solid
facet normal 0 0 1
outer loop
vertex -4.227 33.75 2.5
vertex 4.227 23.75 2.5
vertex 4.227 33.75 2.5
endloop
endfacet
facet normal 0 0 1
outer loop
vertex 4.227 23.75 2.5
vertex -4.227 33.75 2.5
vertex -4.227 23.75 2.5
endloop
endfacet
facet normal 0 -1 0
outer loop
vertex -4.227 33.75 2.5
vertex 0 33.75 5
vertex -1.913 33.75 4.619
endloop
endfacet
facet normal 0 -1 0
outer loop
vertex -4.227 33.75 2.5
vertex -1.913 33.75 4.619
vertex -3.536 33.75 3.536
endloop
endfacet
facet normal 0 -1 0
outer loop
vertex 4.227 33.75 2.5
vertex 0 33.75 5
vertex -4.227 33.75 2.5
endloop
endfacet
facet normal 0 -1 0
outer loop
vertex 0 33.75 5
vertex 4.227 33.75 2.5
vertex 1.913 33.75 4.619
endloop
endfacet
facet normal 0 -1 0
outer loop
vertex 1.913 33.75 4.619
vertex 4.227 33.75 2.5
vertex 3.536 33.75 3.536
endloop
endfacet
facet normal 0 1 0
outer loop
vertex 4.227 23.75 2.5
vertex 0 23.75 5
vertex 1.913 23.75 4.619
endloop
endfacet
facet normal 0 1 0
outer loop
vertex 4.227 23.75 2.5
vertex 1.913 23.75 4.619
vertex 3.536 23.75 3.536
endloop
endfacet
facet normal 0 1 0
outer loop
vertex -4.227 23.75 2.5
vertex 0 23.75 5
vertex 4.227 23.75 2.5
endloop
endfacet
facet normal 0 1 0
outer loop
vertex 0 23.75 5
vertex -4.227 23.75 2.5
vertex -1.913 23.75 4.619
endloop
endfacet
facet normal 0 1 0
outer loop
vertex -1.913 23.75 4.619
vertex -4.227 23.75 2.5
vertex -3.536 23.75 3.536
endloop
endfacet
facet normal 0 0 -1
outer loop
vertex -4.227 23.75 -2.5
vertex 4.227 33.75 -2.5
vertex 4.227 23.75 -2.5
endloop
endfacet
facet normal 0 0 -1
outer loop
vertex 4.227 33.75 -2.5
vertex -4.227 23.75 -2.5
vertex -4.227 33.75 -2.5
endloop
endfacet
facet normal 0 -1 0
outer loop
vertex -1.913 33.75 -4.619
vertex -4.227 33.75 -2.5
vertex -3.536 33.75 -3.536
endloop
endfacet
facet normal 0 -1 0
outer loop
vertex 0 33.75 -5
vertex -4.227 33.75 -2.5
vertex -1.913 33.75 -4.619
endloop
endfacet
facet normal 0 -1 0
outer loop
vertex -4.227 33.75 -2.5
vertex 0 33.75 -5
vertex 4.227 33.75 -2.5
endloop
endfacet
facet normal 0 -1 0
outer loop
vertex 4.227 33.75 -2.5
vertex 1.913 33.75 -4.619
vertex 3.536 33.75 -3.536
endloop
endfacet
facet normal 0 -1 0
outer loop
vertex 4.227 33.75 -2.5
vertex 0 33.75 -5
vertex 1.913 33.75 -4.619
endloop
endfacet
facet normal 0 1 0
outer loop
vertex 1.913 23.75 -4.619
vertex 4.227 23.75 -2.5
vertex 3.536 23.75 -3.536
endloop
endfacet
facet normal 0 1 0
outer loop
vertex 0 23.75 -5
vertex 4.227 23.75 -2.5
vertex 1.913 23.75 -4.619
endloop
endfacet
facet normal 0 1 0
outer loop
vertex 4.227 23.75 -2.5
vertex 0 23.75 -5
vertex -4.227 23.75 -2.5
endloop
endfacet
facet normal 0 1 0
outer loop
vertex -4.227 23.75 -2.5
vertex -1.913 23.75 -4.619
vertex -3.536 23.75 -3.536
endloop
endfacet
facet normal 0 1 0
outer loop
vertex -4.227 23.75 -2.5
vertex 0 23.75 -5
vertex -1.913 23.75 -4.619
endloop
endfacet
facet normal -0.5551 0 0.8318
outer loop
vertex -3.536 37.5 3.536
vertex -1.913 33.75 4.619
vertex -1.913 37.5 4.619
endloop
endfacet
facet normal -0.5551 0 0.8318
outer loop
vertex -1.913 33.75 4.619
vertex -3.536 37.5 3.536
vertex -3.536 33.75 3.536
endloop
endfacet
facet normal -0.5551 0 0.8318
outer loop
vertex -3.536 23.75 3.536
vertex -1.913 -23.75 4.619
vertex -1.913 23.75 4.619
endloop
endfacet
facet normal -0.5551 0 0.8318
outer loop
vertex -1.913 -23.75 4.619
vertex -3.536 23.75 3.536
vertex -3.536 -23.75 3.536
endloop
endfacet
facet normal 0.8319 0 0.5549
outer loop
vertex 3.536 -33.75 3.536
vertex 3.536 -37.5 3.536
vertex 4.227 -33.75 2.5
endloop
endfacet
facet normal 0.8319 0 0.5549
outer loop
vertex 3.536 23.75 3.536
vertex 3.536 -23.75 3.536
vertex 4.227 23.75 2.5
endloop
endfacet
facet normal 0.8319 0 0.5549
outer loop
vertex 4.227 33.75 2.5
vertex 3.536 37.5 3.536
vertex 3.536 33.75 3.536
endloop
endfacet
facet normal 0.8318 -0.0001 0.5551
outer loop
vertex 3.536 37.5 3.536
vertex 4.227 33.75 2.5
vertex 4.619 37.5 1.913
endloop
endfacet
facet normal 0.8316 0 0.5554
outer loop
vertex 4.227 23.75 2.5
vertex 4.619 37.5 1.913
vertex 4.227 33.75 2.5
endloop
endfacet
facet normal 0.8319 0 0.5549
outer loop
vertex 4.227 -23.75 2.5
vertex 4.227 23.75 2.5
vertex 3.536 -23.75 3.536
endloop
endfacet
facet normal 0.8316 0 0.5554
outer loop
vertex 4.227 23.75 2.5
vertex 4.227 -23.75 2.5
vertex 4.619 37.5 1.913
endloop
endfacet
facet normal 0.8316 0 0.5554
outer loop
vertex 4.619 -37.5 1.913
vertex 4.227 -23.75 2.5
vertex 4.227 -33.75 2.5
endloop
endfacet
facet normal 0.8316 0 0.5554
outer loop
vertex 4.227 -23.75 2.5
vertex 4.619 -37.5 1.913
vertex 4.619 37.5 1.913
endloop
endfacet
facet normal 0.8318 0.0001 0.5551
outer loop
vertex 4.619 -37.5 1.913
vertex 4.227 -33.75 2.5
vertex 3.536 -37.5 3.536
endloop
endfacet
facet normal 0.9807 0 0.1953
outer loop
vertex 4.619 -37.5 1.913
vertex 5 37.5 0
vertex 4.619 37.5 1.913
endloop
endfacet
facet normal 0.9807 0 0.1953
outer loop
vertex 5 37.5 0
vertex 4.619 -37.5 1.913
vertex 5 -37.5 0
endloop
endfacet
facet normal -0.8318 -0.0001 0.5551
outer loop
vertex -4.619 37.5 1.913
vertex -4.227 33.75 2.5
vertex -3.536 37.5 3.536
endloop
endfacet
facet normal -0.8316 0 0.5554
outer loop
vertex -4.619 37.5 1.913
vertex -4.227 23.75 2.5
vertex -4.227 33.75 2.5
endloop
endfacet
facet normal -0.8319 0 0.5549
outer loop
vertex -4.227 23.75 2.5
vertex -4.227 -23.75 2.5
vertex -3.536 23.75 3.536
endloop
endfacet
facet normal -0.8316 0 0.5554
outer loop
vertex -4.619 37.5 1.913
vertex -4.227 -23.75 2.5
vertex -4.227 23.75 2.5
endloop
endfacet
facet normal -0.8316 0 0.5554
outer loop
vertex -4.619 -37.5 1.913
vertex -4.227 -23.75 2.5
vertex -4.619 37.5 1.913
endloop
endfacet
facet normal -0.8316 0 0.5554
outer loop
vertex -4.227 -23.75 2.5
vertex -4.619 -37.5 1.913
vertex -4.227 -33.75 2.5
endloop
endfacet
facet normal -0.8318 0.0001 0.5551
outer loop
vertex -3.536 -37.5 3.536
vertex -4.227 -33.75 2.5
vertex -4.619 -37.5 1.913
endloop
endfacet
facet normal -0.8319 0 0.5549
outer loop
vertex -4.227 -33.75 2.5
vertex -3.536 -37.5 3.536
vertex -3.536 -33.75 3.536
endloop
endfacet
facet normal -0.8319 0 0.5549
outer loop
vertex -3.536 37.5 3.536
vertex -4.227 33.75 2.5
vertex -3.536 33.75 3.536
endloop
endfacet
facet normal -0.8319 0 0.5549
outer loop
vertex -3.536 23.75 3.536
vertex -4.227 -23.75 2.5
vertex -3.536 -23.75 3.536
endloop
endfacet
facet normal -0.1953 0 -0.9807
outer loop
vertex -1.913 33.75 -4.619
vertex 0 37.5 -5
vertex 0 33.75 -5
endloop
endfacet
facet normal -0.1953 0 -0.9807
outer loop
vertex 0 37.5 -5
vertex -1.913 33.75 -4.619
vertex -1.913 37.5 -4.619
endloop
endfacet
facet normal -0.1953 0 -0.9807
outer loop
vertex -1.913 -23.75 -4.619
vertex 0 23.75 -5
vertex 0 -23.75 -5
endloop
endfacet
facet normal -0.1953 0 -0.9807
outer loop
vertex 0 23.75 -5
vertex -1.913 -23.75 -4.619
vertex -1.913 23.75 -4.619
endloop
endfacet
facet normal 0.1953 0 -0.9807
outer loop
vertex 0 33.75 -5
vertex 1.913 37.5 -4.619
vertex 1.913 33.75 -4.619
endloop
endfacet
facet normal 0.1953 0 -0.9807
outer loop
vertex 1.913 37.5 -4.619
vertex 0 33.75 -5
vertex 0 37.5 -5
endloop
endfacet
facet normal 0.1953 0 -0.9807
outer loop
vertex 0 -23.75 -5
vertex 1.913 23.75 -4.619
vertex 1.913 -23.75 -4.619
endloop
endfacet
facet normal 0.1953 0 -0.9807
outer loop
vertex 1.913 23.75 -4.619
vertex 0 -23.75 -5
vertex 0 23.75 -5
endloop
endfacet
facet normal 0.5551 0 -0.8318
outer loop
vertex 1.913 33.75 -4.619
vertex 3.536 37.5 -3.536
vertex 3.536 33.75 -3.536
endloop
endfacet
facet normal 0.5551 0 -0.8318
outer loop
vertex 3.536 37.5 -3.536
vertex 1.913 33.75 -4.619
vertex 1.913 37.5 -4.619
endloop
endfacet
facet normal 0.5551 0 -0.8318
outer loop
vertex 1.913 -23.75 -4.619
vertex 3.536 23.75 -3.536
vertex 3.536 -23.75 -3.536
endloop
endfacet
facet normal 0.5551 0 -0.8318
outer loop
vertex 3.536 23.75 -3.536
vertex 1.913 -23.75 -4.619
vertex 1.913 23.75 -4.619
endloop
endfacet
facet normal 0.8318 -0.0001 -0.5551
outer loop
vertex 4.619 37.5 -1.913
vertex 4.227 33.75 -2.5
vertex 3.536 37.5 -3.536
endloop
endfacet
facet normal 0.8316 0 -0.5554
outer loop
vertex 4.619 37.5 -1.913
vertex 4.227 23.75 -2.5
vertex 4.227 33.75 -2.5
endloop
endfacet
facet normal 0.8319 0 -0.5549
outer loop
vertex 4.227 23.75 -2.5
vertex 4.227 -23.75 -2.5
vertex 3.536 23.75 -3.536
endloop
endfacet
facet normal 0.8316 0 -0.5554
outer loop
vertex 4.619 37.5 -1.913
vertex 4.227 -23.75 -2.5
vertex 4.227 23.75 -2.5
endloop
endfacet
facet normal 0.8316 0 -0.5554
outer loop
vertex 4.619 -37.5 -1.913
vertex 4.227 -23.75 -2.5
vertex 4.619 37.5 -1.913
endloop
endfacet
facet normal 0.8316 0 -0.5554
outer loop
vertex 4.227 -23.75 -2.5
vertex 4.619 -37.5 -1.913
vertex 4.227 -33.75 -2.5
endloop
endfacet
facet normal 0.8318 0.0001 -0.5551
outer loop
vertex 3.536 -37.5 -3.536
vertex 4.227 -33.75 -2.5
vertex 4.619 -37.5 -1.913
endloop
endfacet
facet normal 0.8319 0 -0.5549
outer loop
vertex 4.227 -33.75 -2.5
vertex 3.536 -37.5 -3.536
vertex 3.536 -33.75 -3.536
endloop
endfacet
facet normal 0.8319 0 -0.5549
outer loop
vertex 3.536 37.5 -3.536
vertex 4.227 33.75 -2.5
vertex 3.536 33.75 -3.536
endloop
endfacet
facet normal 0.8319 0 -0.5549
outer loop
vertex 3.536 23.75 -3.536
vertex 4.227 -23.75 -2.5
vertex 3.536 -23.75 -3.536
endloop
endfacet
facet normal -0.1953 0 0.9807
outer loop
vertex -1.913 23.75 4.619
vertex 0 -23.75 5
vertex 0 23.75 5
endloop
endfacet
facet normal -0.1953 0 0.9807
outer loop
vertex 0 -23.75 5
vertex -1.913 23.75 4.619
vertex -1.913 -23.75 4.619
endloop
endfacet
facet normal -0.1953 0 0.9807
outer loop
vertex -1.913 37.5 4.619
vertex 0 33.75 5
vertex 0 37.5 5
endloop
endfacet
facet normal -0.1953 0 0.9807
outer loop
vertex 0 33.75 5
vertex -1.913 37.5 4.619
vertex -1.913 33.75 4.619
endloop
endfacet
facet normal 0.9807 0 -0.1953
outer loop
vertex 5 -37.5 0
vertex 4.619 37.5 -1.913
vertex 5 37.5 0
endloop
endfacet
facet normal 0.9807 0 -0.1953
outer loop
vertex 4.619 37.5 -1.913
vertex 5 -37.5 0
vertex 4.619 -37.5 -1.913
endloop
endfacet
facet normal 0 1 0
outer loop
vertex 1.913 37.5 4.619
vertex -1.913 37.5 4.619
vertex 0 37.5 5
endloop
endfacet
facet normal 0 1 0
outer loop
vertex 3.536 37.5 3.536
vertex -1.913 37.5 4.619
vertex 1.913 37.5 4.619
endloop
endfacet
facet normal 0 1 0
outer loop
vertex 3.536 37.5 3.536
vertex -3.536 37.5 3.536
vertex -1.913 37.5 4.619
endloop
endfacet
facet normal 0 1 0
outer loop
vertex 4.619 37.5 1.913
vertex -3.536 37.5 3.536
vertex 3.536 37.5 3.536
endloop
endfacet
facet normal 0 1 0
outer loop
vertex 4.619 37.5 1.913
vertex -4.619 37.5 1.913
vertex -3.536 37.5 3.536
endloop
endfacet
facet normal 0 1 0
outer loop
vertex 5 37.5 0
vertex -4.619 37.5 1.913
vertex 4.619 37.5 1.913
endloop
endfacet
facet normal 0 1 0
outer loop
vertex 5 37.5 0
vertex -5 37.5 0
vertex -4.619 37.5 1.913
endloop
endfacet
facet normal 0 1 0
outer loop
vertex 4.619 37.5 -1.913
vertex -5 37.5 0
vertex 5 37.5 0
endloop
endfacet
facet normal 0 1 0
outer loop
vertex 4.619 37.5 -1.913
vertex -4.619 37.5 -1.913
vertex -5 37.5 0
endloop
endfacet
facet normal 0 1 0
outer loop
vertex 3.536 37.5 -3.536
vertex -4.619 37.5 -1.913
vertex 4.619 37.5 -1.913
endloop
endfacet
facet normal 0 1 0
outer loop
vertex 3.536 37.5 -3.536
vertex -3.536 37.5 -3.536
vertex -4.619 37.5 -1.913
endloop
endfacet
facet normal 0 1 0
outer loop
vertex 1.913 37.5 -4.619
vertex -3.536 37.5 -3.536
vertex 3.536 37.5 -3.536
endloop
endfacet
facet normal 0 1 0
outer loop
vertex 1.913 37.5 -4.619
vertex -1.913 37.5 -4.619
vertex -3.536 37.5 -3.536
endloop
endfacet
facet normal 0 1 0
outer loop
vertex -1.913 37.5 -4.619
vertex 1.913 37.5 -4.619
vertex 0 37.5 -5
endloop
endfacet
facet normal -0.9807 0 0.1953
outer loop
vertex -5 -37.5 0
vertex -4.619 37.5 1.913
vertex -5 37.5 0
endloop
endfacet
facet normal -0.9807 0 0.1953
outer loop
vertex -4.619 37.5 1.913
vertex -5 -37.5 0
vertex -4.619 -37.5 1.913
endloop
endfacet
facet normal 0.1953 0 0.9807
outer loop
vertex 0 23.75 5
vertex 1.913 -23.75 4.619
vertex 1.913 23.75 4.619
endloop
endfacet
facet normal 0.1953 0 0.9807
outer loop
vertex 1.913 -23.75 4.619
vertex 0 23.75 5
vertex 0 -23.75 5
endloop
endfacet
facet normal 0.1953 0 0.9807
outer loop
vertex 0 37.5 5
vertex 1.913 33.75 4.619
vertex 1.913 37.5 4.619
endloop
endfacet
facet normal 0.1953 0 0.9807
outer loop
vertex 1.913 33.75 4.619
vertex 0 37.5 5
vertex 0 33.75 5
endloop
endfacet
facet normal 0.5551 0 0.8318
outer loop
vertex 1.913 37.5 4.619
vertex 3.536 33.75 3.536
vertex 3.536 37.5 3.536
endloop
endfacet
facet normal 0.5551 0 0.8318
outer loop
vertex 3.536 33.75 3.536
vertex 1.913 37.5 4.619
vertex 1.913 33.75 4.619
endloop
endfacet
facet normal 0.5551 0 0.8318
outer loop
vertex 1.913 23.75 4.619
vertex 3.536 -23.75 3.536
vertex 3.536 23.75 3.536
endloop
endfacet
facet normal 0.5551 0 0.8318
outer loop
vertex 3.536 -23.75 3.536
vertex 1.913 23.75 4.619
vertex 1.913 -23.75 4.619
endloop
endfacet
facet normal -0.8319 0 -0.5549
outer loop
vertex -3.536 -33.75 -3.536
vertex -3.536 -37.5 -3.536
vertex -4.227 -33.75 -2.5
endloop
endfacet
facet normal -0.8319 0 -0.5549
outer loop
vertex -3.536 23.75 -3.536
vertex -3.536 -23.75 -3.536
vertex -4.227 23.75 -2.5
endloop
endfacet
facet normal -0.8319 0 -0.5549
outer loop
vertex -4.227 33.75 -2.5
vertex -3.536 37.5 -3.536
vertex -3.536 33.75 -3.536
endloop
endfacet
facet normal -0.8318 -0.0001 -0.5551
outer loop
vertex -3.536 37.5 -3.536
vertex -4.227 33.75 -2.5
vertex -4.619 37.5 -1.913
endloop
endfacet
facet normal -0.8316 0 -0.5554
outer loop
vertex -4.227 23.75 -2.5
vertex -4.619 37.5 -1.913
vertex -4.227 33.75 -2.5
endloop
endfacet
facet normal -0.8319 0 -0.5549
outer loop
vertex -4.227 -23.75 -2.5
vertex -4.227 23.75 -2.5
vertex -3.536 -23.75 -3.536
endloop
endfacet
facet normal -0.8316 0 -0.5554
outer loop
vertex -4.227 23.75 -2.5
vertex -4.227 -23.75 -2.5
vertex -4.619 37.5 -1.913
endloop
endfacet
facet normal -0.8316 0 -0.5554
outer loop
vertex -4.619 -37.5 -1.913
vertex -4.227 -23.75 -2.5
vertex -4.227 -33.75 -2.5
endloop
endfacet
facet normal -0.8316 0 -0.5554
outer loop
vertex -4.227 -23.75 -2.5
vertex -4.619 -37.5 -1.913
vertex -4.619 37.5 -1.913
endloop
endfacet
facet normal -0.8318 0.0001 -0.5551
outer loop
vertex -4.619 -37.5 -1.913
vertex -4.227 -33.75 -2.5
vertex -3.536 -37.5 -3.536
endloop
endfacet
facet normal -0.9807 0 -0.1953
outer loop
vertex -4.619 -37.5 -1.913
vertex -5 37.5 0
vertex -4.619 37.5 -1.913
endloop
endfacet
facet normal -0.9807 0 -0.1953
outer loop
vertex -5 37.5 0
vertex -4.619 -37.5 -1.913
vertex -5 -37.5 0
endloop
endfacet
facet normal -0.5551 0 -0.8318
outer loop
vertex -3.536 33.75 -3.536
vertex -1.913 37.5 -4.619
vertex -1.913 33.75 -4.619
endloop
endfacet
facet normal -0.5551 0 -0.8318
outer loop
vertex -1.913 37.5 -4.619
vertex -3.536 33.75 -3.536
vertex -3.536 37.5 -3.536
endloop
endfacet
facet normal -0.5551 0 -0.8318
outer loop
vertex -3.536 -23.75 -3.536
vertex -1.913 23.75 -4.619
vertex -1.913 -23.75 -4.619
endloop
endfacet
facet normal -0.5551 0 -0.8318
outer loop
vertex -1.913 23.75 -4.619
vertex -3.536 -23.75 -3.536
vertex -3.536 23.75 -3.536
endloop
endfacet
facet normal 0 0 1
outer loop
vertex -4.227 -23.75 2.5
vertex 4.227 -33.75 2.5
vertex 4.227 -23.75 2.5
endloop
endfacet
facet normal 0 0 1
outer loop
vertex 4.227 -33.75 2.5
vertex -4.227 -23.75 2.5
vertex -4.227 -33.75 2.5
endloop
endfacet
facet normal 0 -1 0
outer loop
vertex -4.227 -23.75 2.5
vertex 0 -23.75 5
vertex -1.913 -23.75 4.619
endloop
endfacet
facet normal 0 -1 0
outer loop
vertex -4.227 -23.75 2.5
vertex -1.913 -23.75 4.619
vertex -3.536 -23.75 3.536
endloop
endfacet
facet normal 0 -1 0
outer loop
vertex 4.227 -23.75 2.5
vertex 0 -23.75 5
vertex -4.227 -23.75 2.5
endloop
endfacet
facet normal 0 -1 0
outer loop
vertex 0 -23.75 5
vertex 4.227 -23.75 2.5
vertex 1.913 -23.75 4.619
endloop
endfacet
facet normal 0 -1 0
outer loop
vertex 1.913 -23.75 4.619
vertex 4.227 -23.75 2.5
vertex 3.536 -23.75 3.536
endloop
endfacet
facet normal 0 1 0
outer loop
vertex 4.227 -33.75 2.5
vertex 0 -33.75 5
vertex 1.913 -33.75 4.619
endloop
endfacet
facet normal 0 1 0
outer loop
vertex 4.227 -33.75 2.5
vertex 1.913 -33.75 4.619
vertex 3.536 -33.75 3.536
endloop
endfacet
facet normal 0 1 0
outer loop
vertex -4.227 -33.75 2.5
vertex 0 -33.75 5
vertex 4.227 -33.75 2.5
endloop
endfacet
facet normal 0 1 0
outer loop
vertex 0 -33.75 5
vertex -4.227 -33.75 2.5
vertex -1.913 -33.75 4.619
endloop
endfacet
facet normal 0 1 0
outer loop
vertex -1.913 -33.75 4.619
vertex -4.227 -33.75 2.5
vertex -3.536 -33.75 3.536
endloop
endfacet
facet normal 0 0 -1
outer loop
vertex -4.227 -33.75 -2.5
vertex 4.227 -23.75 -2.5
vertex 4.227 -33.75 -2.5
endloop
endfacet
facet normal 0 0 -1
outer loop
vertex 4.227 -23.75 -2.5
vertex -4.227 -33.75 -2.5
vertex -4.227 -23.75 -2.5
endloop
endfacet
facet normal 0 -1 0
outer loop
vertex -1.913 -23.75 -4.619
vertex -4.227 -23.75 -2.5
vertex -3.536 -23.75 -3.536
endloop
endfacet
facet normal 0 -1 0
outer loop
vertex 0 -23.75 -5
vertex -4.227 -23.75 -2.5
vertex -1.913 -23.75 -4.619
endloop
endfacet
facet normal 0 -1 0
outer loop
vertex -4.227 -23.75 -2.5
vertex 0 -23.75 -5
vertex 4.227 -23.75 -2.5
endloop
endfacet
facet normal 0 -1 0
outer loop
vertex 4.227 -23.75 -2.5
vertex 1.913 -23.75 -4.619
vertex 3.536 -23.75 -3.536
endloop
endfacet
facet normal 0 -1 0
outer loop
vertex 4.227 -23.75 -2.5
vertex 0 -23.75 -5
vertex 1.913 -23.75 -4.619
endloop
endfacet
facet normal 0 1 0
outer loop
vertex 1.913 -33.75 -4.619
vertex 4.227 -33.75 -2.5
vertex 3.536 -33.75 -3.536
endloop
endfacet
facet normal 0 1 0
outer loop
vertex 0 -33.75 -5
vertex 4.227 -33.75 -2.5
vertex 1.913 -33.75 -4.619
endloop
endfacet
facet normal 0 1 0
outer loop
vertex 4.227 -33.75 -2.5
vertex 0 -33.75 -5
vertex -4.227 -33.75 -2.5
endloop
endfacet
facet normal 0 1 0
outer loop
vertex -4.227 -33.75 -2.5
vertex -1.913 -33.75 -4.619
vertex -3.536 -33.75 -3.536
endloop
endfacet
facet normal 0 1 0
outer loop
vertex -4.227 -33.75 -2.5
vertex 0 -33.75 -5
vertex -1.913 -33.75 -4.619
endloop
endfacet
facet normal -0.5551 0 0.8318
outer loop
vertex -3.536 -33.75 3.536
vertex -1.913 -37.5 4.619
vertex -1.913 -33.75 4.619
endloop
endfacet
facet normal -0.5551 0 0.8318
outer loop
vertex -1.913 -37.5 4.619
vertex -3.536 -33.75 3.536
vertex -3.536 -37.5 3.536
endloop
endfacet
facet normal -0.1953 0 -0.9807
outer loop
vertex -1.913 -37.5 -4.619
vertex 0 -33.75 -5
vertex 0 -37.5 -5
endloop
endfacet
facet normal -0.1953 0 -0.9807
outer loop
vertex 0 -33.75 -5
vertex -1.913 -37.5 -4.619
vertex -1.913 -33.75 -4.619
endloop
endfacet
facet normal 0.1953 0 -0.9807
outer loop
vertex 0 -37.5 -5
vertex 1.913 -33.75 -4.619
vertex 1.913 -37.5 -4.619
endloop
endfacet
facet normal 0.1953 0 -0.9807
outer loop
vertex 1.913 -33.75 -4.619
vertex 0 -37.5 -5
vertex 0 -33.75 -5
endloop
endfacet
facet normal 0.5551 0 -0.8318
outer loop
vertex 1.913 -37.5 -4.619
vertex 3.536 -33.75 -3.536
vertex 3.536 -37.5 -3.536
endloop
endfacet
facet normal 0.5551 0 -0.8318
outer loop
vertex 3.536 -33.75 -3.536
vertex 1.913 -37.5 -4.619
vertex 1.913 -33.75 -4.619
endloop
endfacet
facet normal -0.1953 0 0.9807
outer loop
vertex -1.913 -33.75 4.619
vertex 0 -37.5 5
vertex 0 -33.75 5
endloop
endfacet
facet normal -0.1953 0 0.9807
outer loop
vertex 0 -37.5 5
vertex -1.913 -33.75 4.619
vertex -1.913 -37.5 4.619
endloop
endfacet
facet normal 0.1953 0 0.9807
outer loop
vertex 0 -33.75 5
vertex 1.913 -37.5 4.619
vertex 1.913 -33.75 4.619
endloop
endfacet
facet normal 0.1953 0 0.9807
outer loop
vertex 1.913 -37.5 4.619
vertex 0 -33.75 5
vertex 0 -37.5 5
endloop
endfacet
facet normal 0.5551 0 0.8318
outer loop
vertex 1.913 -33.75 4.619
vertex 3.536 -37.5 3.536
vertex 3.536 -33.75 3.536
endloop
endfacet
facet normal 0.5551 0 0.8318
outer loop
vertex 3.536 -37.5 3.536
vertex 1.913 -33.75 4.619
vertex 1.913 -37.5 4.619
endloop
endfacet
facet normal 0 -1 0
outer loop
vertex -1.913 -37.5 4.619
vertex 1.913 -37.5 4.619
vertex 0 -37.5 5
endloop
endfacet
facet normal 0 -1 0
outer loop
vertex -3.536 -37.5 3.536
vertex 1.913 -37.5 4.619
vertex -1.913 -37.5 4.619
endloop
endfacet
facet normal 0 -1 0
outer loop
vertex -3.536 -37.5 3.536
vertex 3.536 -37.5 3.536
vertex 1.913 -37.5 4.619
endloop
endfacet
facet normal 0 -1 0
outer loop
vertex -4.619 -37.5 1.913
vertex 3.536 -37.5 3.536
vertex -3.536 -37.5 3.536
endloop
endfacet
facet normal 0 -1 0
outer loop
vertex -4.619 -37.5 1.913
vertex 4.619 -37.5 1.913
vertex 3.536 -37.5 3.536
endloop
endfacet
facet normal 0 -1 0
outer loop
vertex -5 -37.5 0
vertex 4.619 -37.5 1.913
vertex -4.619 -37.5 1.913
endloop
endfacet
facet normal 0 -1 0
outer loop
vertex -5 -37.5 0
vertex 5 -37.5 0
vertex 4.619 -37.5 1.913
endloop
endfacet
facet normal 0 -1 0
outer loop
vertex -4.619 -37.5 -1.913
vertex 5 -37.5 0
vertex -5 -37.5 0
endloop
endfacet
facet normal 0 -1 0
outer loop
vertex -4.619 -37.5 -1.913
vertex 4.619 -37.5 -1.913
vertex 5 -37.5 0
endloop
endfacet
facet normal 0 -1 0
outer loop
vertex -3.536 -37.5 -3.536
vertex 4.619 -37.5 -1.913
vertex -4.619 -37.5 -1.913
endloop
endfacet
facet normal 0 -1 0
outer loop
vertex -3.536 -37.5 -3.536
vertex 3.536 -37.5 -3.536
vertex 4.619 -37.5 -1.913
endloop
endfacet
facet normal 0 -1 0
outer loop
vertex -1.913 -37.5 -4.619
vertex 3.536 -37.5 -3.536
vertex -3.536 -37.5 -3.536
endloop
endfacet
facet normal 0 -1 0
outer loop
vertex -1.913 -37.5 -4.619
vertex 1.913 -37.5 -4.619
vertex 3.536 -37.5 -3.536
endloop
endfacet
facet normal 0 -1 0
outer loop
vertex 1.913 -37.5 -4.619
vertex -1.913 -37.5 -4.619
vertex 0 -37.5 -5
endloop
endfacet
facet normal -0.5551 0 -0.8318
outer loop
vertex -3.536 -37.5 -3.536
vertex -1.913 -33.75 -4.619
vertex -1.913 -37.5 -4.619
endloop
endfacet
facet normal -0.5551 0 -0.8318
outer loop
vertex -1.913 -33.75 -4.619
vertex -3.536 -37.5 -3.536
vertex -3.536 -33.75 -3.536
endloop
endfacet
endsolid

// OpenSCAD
//Lincoln Logs

//All measurements below in mm
//You only need to change length and radius of log

//Length of Log
    L=40;
//Radius of Log
    R=5;
    
//Cutout Cube Size for Endcap Difference
    w=R*2;
    d=R*2;
    h=R;
//Length of Endcap
    E=w+1.5*R;
//Angle Log is Oriented At
    X=90;
    Y=0;
    Z=0;
//Translate Endcaps
    a=0;
    b=(L/2)+(E/2);
    c=0;
//Translate Cutouts
    x=0;
    y=0;
    z=R;
    
module log(){
//Positive Y Endcap of Log
translate ([a,b,c])difference() {
    rotate([X,Y,Z])cylinder(E,R,R,center=true);
    union(){
        translate([x,y,z])cube([w,d,h],center=true);
        translate([-x,y,-z])cube([w,d,h],center=true);
            }
        }
//Negative Y Endcap of Log
translate ([a,-b,c])difference() {
    rotate([X,Y,Z])cylinder(E,R,R,center=true);
    union(){
        translate([x,y,z])cube([w,d,h],center=true);
        translate([-x,y,-z])cube([w,d,h],center=true);
            }
        }
//Middle Cylinder
 rotate([X,Y,Z])cylinder(L,R,R,center=true);
}
log();
